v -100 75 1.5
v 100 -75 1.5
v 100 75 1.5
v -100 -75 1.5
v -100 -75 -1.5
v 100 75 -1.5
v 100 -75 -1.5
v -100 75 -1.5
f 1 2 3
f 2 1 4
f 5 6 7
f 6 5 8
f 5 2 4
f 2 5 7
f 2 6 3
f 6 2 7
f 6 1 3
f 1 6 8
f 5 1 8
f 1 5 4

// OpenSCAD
$fn = 64;

// Sheet acrylic
length = 200;
width  = 150;
thickness = 3;

// Slight tint + transparency to read as acrylic in preview/renders
acrylic_rgba = [0.75, 0.90, 1.00, 0.25];

color(acrylic_rgba)
    cube([length, width, thickness], center=true);
